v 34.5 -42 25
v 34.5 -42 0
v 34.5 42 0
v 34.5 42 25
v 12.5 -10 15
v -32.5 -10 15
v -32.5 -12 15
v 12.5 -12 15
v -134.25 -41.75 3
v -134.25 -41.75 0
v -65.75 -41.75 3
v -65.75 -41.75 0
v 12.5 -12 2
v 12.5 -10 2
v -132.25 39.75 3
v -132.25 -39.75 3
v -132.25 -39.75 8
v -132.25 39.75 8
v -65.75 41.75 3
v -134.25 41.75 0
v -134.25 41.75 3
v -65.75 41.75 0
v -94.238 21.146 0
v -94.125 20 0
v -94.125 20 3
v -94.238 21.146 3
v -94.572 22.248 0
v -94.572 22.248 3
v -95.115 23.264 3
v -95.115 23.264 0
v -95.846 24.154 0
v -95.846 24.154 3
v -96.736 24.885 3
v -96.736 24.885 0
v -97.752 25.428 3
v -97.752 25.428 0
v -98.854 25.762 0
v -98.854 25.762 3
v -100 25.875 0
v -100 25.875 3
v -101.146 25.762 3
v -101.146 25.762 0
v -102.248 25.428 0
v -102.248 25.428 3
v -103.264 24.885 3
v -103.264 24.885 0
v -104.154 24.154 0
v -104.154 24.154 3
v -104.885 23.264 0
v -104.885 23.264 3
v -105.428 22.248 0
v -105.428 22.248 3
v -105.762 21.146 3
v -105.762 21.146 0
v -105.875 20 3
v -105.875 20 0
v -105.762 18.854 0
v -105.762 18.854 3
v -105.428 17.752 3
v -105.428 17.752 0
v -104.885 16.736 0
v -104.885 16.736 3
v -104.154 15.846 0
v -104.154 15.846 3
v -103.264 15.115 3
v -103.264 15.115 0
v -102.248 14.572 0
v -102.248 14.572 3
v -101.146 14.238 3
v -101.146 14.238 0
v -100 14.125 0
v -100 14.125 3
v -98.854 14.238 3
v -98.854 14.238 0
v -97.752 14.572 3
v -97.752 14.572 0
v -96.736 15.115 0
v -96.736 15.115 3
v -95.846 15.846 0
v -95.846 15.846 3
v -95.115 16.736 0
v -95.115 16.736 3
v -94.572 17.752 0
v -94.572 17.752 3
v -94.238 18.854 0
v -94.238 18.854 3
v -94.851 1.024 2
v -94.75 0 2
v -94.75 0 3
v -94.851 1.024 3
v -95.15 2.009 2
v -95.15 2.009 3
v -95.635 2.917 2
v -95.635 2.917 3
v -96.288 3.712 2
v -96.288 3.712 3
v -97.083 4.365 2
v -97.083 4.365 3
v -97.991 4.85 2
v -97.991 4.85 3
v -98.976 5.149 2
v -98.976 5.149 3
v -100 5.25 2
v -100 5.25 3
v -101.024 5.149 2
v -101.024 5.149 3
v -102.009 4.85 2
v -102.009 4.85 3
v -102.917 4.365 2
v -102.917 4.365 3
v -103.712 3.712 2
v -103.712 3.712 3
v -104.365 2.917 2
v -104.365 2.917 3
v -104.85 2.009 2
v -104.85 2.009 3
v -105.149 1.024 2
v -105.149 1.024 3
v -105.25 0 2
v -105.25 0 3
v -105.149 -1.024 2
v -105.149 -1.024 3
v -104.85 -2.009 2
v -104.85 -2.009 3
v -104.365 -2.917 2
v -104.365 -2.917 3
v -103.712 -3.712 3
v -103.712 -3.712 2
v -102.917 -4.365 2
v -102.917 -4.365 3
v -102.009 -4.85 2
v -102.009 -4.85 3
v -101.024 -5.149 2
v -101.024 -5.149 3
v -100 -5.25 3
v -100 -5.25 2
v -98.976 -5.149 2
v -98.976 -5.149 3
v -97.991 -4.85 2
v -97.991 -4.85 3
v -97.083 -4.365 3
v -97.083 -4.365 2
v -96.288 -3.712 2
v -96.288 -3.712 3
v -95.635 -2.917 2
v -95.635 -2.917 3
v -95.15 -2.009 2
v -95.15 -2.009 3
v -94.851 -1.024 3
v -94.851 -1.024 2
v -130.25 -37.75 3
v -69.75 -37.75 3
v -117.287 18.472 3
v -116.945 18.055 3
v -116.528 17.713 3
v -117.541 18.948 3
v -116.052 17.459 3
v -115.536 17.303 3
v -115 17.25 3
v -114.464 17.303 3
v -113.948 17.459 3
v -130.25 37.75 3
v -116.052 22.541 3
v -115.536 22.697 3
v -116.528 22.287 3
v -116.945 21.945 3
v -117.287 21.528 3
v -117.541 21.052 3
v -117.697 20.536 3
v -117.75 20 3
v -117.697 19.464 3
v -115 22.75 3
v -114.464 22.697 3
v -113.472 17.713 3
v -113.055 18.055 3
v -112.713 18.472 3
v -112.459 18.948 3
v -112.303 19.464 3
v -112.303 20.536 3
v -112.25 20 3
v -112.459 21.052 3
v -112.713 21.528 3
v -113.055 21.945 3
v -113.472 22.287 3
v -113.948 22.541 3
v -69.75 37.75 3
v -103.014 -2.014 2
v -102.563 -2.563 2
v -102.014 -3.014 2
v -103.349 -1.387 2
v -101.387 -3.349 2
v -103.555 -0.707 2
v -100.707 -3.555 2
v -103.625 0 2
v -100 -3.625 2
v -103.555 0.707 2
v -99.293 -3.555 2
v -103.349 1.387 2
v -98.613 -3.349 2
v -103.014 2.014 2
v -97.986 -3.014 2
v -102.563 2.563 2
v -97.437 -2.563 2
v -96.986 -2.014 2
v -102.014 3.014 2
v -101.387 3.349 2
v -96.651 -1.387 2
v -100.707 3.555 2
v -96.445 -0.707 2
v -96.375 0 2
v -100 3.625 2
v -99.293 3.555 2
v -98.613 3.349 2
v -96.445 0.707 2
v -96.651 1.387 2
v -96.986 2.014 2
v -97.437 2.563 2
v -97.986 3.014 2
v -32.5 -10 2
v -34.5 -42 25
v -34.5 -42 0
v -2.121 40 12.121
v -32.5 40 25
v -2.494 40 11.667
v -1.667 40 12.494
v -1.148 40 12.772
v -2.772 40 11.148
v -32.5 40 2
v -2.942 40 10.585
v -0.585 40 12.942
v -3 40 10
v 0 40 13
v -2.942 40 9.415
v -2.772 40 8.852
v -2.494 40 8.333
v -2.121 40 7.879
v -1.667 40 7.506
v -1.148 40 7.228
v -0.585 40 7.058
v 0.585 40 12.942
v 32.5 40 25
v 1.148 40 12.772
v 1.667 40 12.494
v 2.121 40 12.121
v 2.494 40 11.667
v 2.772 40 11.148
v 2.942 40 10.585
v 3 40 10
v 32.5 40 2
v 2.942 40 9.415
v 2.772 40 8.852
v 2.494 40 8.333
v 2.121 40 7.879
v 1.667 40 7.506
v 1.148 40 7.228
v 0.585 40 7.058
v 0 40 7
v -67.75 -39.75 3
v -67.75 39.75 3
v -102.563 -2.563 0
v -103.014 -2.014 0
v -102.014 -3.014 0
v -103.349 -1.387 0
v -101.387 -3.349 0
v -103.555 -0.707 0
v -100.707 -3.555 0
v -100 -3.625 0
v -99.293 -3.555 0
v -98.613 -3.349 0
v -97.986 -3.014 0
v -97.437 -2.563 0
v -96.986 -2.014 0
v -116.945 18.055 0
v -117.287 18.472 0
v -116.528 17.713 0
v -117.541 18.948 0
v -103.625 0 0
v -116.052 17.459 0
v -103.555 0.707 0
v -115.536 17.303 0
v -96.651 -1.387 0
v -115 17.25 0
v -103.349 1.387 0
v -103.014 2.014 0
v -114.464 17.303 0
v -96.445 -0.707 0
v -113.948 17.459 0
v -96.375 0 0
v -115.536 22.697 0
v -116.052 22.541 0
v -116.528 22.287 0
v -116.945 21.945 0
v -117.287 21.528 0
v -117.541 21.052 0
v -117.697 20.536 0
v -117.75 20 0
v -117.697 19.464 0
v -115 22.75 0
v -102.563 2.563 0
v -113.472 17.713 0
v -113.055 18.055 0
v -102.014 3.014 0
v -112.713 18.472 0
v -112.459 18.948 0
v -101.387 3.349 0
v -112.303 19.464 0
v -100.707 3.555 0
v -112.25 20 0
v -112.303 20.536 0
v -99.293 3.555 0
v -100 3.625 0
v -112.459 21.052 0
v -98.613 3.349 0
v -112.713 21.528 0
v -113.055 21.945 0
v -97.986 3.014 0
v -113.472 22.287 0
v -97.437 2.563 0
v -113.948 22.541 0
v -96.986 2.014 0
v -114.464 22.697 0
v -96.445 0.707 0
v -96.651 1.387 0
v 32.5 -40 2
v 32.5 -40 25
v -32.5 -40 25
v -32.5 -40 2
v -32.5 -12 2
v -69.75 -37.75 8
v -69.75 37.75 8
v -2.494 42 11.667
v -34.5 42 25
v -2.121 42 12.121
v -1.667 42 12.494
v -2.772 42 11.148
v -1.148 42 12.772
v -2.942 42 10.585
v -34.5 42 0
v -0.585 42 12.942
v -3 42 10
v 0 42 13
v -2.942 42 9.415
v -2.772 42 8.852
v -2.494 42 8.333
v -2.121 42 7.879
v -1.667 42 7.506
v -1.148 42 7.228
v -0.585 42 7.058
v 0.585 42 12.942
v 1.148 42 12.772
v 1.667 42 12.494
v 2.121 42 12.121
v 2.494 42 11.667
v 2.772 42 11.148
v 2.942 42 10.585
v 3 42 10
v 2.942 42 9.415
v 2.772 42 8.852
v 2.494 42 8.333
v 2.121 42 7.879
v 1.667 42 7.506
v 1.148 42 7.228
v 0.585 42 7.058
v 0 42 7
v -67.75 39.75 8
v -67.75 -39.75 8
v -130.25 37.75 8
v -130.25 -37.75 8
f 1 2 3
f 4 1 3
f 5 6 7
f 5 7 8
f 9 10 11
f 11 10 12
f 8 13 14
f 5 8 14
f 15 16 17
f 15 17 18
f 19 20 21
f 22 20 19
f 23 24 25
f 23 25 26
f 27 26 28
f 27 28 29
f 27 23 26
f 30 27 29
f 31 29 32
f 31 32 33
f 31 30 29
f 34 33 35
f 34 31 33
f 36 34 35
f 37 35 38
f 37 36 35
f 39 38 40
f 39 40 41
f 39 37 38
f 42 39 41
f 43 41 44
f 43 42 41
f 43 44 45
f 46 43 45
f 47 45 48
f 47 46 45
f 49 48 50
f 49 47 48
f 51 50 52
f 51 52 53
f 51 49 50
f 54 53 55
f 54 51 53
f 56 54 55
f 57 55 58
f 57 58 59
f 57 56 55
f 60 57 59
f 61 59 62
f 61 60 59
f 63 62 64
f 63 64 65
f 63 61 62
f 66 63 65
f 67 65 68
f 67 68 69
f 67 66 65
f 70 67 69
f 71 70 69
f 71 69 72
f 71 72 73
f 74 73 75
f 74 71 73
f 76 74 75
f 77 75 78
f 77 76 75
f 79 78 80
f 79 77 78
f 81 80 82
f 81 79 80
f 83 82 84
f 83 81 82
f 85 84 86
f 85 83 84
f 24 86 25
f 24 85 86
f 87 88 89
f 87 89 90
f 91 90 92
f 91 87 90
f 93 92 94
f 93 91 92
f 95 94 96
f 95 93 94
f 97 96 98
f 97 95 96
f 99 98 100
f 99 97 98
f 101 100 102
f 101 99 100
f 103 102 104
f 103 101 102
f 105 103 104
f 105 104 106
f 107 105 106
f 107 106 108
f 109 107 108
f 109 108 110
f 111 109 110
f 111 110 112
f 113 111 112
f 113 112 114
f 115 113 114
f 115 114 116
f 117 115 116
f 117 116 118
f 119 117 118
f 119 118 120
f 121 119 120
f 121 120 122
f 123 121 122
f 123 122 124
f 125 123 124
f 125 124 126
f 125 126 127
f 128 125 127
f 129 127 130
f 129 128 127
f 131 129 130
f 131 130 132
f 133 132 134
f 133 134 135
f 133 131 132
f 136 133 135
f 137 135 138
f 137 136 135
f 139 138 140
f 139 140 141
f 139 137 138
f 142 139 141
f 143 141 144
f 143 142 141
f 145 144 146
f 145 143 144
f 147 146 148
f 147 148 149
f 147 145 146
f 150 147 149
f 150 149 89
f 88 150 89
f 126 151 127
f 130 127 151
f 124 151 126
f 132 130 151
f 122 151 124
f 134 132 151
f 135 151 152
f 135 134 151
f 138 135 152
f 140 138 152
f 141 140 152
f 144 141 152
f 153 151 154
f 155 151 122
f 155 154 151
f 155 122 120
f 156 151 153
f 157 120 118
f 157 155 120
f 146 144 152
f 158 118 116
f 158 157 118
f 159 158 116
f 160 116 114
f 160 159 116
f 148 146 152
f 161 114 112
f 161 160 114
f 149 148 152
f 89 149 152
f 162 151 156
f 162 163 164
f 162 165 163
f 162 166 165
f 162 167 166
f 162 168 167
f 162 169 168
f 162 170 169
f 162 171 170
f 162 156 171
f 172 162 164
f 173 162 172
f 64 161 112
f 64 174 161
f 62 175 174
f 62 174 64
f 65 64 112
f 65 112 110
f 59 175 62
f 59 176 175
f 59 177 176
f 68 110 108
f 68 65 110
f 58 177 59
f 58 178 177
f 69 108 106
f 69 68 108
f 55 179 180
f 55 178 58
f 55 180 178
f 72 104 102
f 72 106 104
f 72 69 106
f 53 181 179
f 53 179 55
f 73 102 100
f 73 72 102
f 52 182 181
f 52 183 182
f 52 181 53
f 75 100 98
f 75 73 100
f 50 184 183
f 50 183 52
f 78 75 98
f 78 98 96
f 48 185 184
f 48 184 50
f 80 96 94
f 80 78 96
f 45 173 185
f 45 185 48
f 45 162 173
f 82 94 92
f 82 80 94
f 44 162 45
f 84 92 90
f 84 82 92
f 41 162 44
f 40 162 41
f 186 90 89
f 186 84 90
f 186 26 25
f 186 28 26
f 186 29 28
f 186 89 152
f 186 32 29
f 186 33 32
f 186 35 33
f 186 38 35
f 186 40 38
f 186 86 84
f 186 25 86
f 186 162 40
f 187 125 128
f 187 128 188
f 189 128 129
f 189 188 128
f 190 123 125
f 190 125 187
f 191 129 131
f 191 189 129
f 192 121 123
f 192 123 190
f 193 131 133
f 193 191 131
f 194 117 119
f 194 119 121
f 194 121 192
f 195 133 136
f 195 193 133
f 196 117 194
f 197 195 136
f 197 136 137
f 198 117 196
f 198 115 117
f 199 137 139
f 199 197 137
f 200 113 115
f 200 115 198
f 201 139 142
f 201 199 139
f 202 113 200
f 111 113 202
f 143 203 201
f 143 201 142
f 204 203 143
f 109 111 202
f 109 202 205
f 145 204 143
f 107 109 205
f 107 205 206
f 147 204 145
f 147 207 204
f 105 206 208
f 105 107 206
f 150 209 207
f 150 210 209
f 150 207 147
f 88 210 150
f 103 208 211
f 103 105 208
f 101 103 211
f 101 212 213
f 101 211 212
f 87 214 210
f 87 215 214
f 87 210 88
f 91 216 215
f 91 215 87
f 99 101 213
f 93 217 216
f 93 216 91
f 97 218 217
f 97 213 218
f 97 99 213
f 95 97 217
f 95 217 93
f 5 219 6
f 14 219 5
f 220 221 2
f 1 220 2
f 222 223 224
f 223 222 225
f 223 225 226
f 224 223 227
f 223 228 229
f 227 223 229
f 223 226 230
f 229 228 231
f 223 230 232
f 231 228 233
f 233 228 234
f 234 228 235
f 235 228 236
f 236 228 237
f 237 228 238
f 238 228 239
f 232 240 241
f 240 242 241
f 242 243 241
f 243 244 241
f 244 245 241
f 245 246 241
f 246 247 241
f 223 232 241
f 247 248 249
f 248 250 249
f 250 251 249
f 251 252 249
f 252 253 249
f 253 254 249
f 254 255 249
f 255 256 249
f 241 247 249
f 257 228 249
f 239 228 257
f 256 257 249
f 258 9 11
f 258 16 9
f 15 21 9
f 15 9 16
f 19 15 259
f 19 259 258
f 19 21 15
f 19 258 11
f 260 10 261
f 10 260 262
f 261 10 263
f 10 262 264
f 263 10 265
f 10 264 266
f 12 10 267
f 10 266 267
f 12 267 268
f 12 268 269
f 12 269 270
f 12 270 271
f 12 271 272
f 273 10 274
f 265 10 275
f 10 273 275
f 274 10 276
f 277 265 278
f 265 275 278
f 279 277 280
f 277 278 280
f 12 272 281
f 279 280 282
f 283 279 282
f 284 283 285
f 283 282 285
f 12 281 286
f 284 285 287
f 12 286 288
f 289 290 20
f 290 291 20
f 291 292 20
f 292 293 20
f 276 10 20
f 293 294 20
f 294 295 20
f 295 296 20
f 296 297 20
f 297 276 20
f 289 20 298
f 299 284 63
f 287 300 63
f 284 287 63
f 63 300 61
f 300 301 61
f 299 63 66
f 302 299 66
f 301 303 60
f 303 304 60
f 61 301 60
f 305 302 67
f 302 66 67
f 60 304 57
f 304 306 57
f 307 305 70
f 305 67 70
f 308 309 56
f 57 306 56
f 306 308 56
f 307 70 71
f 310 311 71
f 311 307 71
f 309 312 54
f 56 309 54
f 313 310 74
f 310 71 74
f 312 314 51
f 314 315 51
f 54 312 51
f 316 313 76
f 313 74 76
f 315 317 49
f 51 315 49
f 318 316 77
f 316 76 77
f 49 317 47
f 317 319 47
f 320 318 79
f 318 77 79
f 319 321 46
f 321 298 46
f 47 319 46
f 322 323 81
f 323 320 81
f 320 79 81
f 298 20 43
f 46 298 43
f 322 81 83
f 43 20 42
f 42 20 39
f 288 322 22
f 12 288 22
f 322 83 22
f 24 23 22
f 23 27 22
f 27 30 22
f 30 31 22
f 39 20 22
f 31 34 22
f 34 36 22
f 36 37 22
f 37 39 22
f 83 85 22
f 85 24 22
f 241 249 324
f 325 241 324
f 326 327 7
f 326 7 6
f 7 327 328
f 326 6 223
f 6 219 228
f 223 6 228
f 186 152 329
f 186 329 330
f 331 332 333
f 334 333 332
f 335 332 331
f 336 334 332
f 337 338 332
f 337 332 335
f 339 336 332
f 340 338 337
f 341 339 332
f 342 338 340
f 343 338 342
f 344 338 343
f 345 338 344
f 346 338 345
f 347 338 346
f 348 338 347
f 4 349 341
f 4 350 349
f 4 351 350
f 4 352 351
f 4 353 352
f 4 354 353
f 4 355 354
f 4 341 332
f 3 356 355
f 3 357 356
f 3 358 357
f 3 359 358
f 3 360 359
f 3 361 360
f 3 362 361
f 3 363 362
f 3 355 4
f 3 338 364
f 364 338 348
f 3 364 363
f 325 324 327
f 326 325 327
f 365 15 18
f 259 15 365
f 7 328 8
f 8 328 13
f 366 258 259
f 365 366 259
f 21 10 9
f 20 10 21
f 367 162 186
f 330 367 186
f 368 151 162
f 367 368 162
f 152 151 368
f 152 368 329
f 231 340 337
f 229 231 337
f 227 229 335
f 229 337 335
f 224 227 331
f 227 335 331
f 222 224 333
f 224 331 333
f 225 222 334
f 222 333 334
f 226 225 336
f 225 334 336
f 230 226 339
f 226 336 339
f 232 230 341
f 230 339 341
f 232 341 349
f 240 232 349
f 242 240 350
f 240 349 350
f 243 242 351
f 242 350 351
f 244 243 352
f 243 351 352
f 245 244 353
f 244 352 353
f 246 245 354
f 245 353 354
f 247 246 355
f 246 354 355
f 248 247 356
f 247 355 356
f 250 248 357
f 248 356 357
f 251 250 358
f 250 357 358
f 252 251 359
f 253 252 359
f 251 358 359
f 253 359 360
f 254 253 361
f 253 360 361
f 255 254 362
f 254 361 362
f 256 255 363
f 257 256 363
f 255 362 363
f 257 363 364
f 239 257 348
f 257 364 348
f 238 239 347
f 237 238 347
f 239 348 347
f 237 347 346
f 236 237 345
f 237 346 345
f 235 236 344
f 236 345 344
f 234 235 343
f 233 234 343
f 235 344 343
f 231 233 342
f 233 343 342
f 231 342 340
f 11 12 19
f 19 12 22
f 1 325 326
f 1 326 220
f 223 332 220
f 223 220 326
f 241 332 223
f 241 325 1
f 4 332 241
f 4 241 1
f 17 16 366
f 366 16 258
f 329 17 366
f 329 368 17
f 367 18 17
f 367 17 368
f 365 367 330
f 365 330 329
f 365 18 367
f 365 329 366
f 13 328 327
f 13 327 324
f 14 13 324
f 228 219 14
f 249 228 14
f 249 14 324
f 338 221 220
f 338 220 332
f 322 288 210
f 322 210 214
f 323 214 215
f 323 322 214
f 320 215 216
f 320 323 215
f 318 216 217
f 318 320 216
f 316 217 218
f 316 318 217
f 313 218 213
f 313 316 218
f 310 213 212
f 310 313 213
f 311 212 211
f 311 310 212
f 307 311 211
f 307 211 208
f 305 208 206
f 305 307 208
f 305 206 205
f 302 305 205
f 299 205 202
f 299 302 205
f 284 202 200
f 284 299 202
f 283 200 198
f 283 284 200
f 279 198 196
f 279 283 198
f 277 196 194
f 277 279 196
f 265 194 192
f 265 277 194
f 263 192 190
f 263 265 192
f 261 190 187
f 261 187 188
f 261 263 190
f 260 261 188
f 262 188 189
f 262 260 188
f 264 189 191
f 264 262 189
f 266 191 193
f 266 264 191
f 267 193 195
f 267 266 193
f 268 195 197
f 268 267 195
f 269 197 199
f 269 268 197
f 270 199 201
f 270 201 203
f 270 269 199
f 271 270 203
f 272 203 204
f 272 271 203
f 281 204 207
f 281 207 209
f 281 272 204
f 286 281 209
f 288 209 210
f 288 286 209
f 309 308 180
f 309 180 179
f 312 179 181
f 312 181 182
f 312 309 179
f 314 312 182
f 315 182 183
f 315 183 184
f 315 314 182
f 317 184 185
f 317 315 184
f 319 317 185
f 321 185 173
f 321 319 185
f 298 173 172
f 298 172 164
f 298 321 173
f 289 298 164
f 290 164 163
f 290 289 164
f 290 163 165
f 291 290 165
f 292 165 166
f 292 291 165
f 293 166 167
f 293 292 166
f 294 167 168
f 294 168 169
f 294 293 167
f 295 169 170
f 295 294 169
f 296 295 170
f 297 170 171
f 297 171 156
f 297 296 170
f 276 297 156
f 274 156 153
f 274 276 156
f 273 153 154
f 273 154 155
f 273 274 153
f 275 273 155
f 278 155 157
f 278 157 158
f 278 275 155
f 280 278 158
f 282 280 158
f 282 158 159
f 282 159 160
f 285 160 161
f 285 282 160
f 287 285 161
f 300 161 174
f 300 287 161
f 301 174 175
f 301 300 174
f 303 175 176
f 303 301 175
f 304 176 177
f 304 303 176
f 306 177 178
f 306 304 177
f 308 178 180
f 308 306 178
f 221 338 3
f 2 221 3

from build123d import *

# Parameters (mm, degrees)
F1_DEPTH = 2
F0_W     = 69
F0_H     = 84
F2_DEPTH = 25
F0_W_2   = 45
F0_H_2   = 2
F3_DEPTH = 15
F0_W_3   = 60.5
F0_H_3   = 75.5
F0_R     = 5.25
F0_R_2   = 2.75
F0_R_3   = 5.875
F4_DEPTH = 3
F0_W_4   = 68.5
F0_H_4   = 83.5
F0_W_5   = 64.5
F0_H_5   = 79.5
F5_DEPTH = 8
F0_R_4   = 3.625
F6_DEPTH = 2
F7_R     = 3
F8_DEPTH = 2


with BuildPart() as f1:
    # F0 (on Top) → F1 (new body)
    with BuildSketch(Plane.XY):
        Polygon((32.5, 40), (-32.5, 40), (-32.5, -10), (12.5, -10), (12.5, -12), (-32.5, -12), (-32.5, -40), (32.5, -40), align=None)
    extrude(amount=F1_DEPTH)

    # F0 (on Top) → F2 (join)
    with BuildSketch(Plane.XY):
        Rectangle(F0_W, F0_H)
        Polygon((-32.5, -10), (-32.5, 40), (32.5, 40), (32.5, -40), (-32.5, -40), (-32.5, -12), align=None, mode=Mode.SUBTRACT)
    extrude(amount=F2_DEPTH)

    # F0 (on Top) → F3 (join)
    with BuildSketch(Plane.XY):
        with Locations((-10, -11)):
            Rectangle(F0_W_2, F0_H_2)
    extrude(amount=F3_DEPTH)

    # F7 (on face) → F8 (cut, through all)
    with BuildSketch(Plane(origin=(0, 42, 0), x_dir=(-1, 0, 0), z_dir=(0, 1, 0))):
        with Locations((0, 10)):
            Circle(F7_R)
    extrude(amount=-F8_DEPTH, mode=Mode.SUBTRACT)


with BuildPart() as f4:
    # F0 (on Top) → F4 (new body)
    with BuildSketch(Plane.XY):
        with Locations((-100, 0)):
            Rectangle(F0_W_3, F0_H_3)
        with Locations((-100, 0)):
            Circle(F0_R, mode=Mode.SUBTRACT)
        with Locations((-115, 20)):
            Circle(F0_R_2, mode=Mode.SUBTRACT)
        with Locations((-100, 20)):
            Circle(F0_R_3, mode=Mode.SUBTRACT)
    extrude(amount=F4_DEPTH)



with BuildPart() as f4b:
    # F0 (on Top) → F4, piece 2 (new body)
    with BuildSketch(Plane.XY):
        with Locations((-100, 0)):
            Rectangle(F0_W_4, F0_H_4)
        with Locations((-100, 0)):
            Rectangle(F0_W_5, F0_H_5, mode=Mode.SUBTRACT)
    extrude(amount=F4_DEPTH)


with BuildPart() as f4_1:
    add(f4.part)

    add(f4b.part)  # F5 merges F4b
    # F0 (on Top) → F5 (join)
    with BuildSketch(Plane.XY):
        with Locations((-100, 0)):
            Rectangle(F0_W_5, F0_H_5)
        with Locations((-100, 0)):
            Rectangle(F0_W_3, F0_H_3, mode=Mode.SUBTRACT)
    extrude(amount=F5_DEPTH)

    # F0 (on Top) → F6 (join)
    with BuildSketch(Plane.XY):
        with Locations((-100, 0)):
            Circle(F0_R)
        with Locations((-100, 0)):
            Circle(F0_R_4, mode=Mode.SUBTRACT)
    extrude(amount=F6_DEPTH)


solid = Compound([f1.part, f4_1.part])
